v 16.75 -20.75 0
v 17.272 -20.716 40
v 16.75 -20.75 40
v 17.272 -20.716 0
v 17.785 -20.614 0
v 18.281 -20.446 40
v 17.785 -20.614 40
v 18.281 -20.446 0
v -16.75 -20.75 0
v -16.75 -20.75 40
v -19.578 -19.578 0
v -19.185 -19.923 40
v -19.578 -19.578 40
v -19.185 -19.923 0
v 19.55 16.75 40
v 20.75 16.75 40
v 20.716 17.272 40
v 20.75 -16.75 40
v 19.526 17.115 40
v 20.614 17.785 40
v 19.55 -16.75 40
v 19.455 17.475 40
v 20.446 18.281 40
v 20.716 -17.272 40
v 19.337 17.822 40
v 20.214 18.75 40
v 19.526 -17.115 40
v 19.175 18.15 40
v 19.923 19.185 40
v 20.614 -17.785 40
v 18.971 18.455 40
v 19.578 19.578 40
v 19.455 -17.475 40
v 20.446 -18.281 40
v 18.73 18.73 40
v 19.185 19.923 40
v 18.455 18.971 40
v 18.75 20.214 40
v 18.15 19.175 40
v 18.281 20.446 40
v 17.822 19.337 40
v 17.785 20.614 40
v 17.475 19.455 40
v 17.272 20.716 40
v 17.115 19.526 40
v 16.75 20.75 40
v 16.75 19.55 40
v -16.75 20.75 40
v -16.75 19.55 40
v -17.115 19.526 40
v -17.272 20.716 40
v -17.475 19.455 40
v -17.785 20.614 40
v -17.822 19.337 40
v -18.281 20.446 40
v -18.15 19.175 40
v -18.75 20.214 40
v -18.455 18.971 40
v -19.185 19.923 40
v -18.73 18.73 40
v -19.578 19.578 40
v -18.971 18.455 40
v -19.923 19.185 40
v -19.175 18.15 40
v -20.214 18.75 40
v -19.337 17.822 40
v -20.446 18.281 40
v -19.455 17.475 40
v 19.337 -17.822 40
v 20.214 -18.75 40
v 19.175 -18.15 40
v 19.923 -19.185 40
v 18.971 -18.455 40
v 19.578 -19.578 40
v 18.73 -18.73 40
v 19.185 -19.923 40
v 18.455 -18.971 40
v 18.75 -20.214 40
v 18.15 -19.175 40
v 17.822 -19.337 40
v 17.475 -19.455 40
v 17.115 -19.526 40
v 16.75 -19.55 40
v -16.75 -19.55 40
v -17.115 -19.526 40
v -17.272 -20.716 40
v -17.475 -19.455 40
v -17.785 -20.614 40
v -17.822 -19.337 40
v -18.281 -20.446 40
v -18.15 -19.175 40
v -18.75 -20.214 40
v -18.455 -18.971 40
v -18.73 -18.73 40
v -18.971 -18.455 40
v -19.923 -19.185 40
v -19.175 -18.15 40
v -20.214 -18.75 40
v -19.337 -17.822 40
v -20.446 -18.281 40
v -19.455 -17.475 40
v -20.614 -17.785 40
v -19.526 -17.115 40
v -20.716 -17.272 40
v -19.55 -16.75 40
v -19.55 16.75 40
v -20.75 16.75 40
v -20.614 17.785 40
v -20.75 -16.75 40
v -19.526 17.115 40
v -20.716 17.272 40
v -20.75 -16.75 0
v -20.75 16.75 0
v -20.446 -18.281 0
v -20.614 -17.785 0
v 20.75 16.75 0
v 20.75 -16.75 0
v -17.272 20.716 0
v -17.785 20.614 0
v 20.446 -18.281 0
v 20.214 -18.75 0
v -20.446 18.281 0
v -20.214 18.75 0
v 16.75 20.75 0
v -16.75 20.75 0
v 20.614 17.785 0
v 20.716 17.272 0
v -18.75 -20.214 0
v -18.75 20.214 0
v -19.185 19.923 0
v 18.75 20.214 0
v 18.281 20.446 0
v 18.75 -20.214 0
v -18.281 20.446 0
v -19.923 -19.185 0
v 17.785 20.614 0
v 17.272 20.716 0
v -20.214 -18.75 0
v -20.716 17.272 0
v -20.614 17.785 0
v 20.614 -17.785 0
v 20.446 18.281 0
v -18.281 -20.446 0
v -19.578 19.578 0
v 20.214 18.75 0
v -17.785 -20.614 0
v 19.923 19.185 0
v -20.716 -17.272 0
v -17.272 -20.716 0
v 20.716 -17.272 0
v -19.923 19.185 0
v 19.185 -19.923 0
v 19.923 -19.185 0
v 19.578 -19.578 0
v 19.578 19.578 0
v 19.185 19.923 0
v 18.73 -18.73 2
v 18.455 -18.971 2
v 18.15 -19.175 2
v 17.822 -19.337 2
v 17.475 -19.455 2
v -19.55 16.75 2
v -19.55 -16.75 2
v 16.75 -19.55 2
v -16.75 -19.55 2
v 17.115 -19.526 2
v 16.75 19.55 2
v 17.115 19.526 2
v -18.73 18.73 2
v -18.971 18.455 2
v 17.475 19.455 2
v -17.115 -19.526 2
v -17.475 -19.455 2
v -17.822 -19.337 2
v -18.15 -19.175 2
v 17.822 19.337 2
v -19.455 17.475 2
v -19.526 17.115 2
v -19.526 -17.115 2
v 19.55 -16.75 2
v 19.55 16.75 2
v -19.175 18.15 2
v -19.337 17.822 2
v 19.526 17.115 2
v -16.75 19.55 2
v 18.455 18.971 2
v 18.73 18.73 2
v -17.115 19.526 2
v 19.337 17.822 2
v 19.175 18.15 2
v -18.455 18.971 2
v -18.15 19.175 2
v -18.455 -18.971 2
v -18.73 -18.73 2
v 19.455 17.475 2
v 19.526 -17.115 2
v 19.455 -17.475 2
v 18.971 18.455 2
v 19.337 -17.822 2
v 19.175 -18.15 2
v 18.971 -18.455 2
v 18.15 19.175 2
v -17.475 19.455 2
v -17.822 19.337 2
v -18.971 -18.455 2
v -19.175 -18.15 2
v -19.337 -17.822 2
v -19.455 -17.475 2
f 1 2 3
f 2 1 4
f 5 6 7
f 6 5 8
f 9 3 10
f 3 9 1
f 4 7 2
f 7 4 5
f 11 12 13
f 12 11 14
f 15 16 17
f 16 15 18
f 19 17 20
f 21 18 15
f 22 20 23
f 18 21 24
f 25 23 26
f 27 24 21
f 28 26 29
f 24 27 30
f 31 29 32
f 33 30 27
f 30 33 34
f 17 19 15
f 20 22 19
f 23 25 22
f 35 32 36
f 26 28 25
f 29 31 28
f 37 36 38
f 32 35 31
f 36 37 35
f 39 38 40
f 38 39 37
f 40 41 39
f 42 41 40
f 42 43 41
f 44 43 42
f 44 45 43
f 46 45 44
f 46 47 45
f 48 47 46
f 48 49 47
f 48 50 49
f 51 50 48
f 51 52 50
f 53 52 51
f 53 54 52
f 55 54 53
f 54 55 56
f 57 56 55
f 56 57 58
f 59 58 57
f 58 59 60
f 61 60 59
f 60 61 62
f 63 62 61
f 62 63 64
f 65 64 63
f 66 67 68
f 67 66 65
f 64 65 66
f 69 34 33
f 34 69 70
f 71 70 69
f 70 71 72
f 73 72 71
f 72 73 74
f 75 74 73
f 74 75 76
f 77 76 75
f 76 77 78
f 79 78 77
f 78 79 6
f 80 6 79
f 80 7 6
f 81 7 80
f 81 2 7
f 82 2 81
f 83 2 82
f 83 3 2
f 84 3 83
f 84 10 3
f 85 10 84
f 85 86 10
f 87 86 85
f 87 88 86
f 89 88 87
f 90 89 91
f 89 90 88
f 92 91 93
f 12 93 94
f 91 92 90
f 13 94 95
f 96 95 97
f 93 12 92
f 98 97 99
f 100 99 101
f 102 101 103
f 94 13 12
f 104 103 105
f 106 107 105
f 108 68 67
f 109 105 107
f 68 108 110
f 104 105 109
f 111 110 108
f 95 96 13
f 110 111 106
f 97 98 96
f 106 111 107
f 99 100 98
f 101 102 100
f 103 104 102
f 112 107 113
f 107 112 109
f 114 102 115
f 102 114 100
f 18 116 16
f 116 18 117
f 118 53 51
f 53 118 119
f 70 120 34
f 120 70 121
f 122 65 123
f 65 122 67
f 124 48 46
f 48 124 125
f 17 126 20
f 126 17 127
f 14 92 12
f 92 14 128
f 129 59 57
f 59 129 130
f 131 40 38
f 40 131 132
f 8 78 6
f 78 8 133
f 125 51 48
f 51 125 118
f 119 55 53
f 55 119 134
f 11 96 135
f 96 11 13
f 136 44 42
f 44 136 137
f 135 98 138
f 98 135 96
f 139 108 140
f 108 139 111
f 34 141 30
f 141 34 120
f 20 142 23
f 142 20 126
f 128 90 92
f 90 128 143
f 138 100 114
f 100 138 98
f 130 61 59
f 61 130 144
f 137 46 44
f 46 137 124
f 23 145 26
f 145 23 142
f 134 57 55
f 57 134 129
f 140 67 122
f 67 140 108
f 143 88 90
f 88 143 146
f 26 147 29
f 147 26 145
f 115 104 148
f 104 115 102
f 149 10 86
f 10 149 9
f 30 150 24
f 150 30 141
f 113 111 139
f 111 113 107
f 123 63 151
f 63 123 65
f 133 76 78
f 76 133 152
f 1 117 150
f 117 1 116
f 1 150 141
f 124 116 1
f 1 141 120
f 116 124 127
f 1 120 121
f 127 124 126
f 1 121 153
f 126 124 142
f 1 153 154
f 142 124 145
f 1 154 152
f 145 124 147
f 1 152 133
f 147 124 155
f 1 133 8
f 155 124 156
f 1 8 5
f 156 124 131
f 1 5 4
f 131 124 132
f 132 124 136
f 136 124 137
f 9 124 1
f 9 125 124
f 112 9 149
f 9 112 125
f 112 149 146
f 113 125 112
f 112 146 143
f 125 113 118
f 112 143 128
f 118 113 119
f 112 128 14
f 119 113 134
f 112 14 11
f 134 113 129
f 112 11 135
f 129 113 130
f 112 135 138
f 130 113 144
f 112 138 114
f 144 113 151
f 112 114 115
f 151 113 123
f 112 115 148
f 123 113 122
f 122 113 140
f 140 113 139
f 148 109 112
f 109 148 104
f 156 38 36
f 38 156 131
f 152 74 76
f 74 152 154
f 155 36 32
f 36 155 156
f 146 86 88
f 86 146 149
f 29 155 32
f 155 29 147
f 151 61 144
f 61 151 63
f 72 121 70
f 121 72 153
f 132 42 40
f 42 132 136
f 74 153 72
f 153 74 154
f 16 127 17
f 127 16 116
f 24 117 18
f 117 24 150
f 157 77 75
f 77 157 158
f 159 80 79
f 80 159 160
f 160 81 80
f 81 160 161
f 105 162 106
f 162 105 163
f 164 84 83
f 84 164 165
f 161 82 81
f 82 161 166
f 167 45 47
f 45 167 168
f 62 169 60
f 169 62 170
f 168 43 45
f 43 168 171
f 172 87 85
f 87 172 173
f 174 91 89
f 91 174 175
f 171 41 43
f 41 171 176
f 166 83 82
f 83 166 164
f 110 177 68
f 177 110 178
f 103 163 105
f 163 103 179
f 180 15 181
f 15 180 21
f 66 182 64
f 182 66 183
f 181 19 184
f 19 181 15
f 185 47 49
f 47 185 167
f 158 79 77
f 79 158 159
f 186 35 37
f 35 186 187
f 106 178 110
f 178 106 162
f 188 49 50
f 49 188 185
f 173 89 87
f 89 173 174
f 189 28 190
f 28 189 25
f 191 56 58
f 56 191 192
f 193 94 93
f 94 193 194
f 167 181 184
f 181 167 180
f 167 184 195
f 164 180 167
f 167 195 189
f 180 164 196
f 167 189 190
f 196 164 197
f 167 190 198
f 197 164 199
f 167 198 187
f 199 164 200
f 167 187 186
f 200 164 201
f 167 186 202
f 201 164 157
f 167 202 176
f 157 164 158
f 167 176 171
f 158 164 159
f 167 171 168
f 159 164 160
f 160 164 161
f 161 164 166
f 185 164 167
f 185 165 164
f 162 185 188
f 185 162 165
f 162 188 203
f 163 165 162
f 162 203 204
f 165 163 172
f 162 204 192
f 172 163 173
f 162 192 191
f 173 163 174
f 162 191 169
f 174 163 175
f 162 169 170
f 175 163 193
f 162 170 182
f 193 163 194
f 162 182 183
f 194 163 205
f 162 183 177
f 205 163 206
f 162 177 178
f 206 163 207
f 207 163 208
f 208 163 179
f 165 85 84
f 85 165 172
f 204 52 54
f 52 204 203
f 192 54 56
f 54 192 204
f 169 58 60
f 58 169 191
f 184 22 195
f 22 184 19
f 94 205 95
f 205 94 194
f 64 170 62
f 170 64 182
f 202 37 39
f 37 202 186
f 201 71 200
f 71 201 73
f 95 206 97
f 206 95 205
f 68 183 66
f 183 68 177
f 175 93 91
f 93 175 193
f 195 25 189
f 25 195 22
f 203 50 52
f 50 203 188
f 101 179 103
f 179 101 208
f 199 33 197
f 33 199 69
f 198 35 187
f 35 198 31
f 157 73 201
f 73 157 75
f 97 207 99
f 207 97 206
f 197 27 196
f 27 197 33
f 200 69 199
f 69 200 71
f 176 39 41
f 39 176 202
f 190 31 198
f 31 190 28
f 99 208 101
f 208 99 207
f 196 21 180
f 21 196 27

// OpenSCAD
// Gridfinity-style 1x1 bin: 42 mm grid pitch, 41.5 mm footprint, open top.
grid_pitch = 42;
size = 41.5;
corner_r = 4;
height = 40;
wall = 1.2;
floor_t = 2;

module footprint(inset = 0) {
    offset(r = corner_r - inset, $fn = 48)
        square([size - 2 * corner_r, size - 2 * corner_r], center = true);
}

module bin() {
    difference() {
        linear_extrude(height = height) footprint();
        translate([0, 0, floor_t])
            linear_extrude(height = height) footprint(inset = wall);
    }
}

bin();
